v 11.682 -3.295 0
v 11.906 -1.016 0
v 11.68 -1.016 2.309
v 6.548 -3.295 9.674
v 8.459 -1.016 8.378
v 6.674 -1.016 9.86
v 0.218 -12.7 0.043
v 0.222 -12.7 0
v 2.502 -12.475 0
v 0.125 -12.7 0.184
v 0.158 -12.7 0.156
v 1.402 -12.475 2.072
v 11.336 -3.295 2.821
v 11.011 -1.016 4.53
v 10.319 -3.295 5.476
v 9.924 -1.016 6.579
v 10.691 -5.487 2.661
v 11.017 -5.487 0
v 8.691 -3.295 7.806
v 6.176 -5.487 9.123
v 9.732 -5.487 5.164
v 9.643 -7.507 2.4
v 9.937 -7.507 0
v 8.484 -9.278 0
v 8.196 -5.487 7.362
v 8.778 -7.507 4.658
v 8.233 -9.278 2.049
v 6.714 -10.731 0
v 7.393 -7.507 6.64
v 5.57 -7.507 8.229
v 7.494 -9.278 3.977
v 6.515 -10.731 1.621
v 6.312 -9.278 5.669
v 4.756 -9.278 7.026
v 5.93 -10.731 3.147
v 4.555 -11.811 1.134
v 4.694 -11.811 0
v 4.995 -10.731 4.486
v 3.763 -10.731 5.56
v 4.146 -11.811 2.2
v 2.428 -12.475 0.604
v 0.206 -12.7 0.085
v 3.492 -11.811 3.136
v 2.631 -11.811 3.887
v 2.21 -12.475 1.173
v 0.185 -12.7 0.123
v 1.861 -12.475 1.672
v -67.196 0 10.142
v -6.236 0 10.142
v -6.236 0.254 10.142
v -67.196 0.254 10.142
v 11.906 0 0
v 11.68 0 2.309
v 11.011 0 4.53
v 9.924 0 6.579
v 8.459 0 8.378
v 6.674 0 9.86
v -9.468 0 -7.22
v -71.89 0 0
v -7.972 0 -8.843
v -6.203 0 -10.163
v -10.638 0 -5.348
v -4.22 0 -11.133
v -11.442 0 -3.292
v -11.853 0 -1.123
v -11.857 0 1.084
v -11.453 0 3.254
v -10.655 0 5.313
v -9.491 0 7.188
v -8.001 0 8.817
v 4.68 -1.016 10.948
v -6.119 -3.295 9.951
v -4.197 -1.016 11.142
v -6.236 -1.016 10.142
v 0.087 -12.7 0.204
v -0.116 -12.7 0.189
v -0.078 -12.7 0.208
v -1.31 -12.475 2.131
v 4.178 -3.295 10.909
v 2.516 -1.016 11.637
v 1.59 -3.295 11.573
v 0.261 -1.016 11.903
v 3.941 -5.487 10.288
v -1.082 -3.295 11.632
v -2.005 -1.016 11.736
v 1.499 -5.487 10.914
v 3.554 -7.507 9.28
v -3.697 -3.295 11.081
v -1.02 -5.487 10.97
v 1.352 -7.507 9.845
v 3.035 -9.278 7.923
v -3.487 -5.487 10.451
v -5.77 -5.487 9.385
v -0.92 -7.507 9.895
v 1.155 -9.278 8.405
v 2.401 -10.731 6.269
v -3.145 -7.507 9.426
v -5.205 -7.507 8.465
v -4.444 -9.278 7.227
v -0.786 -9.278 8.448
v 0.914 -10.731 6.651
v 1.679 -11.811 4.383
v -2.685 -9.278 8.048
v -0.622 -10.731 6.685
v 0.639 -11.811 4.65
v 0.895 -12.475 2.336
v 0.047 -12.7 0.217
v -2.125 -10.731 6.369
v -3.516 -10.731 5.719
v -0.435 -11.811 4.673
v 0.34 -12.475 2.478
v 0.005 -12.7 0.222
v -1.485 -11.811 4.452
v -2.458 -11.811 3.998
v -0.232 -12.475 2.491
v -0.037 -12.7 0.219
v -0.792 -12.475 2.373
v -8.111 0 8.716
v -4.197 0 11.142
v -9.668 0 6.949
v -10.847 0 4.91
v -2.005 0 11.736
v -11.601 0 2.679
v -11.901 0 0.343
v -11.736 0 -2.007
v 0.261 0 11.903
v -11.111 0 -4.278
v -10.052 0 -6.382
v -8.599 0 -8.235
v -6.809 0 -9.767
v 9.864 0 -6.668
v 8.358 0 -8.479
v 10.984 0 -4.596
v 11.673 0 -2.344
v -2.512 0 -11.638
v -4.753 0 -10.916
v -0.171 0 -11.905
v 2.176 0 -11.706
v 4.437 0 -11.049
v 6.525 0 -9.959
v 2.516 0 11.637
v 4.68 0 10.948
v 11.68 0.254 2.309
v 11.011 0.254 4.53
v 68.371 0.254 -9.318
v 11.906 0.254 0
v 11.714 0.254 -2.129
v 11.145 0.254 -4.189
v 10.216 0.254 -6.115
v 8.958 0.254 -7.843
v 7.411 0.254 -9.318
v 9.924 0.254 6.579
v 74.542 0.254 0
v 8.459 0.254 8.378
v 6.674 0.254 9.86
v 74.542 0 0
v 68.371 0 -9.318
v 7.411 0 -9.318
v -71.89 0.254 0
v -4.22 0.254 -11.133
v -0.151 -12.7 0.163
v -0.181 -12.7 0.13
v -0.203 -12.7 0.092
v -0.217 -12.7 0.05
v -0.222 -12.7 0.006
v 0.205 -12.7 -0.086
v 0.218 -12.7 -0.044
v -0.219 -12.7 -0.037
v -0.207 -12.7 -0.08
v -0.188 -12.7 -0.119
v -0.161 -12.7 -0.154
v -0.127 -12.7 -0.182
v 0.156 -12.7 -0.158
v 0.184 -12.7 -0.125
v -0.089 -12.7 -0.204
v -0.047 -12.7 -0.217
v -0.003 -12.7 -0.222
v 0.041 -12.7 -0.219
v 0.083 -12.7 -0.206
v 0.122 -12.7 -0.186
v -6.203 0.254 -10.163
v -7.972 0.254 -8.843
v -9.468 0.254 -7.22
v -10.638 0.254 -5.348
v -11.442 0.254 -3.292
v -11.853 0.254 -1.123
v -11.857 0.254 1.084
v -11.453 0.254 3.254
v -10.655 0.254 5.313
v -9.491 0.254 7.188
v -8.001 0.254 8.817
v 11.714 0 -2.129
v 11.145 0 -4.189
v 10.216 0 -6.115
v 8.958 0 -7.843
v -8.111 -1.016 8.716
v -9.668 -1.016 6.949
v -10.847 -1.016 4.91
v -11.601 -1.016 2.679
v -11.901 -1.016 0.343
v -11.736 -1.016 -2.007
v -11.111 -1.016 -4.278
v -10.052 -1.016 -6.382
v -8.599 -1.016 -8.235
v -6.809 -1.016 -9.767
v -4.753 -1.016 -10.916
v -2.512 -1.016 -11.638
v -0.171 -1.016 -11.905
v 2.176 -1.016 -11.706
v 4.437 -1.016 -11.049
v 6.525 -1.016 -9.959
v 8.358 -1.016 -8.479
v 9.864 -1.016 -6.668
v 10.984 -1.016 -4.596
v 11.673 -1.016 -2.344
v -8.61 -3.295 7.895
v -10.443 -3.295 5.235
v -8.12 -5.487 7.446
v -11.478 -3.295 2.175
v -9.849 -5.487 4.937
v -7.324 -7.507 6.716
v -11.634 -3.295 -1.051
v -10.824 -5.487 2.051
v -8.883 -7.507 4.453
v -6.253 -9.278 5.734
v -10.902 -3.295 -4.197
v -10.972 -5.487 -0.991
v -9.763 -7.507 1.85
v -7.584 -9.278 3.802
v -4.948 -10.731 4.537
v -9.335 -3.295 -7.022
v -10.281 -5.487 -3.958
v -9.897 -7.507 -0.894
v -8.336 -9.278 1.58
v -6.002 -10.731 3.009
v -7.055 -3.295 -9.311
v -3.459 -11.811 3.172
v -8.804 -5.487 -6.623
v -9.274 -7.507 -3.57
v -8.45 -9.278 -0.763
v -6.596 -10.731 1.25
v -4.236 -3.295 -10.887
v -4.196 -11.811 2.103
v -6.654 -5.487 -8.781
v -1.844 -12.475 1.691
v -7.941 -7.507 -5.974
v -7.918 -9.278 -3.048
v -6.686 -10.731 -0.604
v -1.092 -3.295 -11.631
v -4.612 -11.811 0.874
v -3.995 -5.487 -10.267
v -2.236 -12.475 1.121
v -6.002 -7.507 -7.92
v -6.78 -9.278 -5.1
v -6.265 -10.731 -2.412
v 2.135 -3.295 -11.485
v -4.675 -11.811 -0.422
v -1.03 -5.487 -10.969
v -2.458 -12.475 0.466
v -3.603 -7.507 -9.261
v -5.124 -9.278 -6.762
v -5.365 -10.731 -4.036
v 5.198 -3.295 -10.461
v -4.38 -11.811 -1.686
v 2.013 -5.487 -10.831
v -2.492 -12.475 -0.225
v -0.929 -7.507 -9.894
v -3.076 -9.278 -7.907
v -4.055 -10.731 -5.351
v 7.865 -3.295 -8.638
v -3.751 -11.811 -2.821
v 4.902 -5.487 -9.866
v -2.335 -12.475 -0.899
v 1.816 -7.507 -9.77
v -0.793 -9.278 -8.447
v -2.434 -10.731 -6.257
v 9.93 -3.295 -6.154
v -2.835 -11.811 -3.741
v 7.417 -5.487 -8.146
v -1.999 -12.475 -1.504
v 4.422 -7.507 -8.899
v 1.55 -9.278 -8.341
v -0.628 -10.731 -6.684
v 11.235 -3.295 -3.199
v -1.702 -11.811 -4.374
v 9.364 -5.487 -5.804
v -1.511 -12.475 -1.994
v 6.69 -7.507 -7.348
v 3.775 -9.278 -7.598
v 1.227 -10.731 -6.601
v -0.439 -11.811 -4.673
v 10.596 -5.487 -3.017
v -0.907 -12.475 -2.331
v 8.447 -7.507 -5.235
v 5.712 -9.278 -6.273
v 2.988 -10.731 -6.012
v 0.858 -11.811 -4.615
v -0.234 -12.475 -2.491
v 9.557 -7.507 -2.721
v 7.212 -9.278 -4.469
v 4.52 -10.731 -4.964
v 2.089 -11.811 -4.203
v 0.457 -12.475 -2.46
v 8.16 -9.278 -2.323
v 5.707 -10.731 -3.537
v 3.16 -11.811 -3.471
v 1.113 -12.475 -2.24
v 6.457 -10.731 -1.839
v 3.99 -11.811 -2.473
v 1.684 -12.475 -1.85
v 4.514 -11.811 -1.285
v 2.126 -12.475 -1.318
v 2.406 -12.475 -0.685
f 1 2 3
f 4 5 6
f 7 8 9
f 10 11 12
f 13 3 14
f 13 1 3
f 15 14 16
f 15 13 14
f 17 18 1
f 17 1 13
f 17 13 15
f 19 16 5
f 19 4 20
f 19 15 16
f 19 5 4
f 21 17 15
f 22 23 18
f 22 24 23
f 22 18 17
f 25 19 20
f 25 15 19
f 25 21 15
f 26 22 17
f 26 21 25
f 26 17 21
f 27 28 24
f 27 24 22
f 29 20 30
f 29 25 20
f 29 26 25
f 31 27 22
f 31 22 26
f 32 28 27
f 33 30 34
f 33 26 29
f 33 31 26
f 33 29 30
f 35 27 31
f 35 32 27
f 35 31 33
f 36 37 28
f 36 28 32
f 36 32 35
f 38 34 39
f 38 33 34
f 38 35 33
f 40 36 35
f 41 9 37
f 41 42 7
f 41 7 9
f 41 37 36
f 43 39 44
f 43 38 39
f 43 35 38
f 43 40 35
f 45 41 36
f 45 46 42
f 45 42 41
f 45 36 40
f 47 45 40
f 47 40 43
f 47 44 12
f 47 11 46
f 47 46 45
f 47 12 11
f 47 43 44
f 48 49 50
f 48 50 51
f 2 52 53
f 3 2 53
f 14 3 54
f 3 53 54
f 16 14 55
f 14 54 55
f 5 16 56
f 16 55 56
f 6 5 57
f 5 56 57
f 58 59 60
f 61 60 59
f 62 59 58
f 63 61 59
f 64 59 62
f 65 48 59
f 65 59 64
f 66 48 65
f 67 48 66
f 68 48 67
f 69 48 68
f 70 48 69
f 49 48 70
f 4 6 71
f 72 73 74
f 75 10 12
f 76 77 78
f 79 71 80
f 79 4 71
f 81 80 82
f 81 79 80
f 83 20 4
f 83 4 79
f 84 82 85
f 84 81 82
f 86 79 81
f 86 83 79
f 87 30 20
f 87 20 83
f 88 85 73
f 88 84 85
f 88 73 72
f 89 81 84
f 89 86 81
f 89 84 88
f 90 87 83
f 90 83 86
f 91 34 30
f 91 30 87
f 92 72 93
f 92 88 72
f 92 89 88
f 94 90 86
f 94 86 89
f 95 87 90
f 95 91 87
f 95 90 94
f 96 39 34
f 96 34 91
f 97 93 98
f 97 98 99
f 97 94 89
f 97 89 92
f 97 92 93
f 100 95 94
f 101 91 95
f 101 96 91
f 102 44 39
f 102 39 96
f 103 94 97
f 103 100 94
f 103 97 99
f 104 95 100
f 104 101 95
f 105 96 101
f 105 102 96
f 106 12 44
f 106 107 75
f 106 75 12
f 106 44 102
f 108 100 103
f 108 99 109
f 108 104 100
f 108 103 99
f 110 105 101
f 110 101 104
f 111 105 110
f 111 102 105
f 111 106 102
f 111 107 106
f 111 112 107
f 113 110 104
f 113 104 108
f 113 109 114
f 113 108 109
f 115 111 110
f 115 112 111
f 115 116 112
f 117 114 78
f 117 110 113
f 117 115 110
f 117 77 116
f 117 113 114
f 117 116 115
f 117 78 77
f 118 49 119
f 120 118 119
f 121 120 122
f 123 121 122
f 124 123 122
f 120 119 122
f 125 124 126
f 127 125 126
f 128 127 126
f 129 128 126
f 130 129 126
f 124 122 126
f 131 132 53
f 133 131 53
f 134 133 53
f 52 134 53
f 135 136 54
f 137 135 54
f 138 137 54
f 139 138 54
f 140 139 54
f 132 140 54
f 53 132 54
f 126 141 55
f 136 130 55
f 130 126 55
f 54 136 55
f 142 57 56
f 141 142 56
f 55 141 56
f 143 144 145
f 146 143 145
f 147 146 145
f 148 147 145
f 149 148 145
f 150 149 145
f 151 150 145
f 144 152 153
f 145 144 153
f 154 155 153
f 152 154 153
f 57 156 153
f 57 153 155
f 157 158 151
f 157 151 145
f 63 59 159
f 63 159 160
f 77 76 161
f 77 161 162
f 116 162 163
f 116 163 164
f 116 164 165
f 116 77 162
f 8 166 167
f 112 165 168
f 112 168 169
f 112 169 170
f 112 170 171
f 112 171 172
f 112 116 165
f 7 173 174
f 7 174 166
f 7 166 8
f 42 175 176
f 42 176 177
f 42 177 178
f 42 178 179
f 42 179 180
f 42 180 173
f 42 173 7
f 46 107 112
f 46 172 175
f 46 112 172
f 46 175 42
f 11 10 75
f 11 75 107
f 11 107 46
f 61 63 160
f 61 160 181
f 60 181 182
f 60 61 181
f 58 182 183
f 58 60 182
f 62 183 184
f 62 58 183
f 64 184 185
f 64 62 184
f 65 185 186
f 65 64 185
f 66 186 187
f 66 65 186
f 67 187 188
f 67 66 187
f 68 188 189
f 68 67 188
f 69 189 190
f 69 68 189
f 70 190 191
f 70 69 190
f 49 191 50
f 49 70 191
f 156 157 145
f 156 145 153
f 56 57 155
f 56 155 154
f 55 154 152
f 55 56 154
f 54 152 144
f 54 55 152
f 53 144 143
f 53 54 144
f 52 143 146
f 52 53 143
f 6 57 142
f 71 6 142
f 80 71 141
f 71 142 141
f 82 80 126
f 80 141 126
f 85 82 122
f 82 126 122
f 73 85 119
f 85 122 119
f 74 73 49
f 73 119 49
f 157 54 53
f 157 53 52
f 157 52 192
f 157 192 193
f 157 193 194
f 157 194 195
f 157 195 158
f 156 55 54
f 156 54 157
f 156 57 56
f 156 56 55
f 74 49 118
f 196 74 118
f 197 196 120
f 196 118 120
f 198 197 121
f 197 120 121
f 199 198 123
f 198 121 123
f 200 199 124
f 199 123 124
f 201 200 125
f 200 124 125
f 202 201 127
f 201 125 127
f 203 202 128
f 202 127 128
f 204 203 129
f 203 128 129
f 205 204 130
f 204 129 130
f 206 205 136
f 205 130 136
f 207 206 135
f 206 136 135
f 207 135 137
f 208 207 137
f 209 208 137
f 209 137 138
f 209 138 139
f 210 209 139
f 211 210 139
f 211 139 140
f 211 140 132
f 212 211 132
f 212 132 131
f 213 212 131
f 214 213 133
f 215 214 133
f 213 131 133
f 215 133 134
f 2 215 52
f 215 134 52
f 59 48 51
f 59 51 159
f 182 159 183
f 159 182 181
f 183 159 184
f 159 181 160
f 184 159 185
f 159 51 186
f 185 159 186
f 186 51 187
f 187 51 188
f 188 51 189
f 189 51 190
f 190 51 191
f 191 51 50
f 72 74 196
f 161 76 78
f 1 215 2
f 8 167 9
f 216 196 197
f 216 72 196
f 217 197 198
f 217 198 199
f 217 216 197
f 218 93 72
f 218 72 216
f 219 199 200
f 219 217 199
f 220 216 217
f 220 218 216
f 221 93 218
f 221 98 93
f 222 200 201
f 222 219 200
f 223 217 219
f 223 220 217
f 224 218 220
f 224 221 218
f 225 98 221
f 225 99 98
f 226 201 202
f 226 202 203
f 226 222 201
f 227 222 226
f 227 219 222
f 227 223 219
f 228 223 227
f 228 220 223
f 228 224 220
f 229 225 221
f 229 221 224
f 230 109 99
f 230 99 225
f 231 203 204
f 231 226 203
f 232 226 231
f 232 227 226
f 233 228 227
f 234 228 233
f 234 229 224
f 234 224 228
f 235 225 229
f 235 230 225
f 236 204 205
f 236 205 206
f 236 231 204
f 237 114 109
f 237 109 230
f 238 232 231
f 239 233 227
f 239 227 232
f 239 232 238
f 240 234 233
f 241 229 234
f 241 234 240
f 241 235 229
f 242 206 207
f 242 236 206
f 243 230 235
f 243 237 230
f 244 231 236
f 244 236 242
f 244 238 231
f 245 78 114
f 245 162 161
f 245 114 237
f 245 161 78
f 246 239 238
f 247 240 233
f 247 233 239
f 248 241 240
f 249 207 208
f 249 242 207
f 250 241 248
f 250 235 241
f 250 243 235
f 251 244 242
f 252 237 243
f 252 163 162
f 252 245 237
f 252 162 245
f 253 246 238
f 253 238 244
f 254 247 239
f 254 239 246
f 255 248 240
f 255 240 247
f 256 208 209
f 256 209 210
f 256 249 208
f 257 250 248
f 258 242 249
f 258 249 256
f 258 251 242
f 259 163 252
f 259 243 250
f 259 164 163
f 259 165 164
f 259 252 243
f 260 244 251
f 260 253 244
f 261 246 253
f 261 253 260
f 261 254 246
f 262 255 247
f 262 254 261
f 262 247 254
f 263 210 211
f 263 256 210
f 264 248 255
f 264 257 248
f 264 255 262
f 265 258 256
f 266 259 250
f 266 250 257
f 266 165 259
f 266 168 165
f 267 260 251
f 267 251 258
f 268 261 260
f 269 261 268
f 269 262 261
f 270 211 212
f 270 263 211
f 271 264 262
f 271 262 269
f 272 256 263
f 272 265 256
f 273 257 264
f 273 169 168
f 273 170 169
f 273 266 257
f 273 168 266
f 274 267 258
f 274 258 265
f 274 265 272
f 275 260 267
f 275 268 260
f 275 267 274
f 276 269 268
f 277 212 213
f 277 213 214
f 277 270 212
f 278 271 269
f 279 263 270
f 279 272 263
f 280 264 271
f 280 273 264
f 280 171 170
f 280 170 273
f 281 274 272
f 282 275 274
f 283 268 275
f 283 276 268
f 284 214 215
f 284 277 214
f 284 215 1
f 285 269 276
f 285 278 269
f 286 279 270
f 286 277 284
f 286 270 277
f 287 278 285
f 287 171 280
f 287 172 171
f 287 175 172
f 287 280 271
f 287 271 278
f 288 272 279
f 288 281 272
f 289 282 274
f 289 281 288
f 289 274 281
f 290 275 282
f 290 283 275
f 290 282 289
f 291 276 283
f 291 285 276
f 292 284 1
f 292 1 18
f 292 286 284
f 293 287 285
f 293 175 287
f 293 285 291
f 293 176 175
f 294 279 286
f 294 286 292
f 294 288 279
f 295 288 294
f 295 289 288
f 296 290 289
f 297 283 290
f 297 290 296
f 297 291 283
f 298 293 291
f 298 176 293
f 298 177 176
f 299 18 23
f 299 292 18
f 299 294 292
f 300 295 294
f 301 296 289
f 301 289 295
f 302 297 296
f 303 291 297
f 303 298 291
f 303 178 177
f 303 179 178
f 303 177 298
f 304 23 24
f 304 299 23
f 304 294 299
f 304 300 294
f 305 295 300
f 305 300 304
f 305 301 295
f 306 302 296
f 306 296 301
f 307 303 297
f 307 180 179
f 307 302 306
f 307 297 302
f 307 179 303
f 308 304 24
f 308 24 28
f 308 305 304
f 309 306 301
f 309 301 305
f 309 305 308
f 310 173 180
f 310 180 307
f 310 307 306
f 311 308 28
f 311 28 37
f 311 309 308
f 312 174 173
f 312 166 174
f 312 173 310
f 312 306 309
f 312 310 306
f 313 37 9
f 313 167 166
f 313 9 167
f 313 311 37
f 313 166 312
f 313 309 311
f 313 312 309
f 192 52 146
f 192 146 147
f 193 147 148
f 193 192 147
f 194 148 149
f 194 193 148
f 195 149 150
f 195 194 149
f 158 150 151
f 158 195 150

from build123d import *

# Parameters (mm, degrees)
F1_DEPTH = 12.7
F2_R     = 11.684
F3_DEPTH = 0.254


with BuildPart() as f1:
    # F0 (on Front) → F1 (new body)
    with BuildSketch(Plane.XZ):
        with BuildLine():
            ThreePointArc((7.411435592, -9.3183132406), (10.7238805165, -5.1728837076), (11.9063150968, 0))
            ThreePointArc((11.9063150968, 0), (10.5172491983, 5.581022172), (6.6741659001, 9.8598097711))
            ThreePointArc((6.6741659001, 9.8598097711), (0.2606131679, 11.9034625198), (-6.2362380975, 10.1424688107))
            ThreePointArc((-6.2362380975, 10.1424688107), (-11.8532061428, -1.1233179959), (-4.2199433469, -11.1333919958))
            ThreePointArc((-4.2199433469, -11.1333919958), (1.8357650747, -11.7639409117), (7.411435592, -9.3183132406))
        make_face()
    extrude(amount=F1_DEPTH)

    # F2
    f2_edges = [f1.edges().sort_by_distance(p)[0] for p in [
        (4.219943, -12.7, 11.133392),
    ]]
    fillet(f2_edges, radius=F2_R)


with BuildPart() as f3:
    # F0 (on Front) → F3 (new body)
    with BuildSketch(Plane.XZ):
        with BuildLine():
            ThreePointArc((-4.2199433469, -11.1333919958), (-11.8532061428, -1.1233179959), (-6.2362380975, 10.1424688107))
            Line((-6.2362380975, 10.1424688107), (-67.1962380975, 10.1424688107))
            Line((-67.1962380975, 10.1424688107), (-71.8902025652, 0))
            Line((-71.8902025652, 0), (-4.2199433469, -11.1333919958))
        make_face()
    extrude(amount=-F3_DEPTH)


with BuildPart() as f3b:
    # F0 (on Front) → F3, piece 2 (new body)
    with BuildSketch(Plane.XZ):
        with BuildLine():
            ThreePointArc((6.6741659001, 9.8598097711), (10.5172491983, 5.581022172), (11.9063150968, 0))
            ThreePointArc((11.9063150968, 0), (10.7238805165, -5.1728837076), (7.411435592, -9.3183132406))
            Line((7.411435592, -9.3183132406), (68.371435592, -9.3183132406))
            Line((68.371435592, -9.3183132406), (74.5416879654, 0))
            Line((74.5416879654, 0), (6.6741659001, 9.8598097711))
        make_face()
    extrude(amount=-F3_DEPTH)


solid = Compound([f1.part, f3.part, f3b.part])
